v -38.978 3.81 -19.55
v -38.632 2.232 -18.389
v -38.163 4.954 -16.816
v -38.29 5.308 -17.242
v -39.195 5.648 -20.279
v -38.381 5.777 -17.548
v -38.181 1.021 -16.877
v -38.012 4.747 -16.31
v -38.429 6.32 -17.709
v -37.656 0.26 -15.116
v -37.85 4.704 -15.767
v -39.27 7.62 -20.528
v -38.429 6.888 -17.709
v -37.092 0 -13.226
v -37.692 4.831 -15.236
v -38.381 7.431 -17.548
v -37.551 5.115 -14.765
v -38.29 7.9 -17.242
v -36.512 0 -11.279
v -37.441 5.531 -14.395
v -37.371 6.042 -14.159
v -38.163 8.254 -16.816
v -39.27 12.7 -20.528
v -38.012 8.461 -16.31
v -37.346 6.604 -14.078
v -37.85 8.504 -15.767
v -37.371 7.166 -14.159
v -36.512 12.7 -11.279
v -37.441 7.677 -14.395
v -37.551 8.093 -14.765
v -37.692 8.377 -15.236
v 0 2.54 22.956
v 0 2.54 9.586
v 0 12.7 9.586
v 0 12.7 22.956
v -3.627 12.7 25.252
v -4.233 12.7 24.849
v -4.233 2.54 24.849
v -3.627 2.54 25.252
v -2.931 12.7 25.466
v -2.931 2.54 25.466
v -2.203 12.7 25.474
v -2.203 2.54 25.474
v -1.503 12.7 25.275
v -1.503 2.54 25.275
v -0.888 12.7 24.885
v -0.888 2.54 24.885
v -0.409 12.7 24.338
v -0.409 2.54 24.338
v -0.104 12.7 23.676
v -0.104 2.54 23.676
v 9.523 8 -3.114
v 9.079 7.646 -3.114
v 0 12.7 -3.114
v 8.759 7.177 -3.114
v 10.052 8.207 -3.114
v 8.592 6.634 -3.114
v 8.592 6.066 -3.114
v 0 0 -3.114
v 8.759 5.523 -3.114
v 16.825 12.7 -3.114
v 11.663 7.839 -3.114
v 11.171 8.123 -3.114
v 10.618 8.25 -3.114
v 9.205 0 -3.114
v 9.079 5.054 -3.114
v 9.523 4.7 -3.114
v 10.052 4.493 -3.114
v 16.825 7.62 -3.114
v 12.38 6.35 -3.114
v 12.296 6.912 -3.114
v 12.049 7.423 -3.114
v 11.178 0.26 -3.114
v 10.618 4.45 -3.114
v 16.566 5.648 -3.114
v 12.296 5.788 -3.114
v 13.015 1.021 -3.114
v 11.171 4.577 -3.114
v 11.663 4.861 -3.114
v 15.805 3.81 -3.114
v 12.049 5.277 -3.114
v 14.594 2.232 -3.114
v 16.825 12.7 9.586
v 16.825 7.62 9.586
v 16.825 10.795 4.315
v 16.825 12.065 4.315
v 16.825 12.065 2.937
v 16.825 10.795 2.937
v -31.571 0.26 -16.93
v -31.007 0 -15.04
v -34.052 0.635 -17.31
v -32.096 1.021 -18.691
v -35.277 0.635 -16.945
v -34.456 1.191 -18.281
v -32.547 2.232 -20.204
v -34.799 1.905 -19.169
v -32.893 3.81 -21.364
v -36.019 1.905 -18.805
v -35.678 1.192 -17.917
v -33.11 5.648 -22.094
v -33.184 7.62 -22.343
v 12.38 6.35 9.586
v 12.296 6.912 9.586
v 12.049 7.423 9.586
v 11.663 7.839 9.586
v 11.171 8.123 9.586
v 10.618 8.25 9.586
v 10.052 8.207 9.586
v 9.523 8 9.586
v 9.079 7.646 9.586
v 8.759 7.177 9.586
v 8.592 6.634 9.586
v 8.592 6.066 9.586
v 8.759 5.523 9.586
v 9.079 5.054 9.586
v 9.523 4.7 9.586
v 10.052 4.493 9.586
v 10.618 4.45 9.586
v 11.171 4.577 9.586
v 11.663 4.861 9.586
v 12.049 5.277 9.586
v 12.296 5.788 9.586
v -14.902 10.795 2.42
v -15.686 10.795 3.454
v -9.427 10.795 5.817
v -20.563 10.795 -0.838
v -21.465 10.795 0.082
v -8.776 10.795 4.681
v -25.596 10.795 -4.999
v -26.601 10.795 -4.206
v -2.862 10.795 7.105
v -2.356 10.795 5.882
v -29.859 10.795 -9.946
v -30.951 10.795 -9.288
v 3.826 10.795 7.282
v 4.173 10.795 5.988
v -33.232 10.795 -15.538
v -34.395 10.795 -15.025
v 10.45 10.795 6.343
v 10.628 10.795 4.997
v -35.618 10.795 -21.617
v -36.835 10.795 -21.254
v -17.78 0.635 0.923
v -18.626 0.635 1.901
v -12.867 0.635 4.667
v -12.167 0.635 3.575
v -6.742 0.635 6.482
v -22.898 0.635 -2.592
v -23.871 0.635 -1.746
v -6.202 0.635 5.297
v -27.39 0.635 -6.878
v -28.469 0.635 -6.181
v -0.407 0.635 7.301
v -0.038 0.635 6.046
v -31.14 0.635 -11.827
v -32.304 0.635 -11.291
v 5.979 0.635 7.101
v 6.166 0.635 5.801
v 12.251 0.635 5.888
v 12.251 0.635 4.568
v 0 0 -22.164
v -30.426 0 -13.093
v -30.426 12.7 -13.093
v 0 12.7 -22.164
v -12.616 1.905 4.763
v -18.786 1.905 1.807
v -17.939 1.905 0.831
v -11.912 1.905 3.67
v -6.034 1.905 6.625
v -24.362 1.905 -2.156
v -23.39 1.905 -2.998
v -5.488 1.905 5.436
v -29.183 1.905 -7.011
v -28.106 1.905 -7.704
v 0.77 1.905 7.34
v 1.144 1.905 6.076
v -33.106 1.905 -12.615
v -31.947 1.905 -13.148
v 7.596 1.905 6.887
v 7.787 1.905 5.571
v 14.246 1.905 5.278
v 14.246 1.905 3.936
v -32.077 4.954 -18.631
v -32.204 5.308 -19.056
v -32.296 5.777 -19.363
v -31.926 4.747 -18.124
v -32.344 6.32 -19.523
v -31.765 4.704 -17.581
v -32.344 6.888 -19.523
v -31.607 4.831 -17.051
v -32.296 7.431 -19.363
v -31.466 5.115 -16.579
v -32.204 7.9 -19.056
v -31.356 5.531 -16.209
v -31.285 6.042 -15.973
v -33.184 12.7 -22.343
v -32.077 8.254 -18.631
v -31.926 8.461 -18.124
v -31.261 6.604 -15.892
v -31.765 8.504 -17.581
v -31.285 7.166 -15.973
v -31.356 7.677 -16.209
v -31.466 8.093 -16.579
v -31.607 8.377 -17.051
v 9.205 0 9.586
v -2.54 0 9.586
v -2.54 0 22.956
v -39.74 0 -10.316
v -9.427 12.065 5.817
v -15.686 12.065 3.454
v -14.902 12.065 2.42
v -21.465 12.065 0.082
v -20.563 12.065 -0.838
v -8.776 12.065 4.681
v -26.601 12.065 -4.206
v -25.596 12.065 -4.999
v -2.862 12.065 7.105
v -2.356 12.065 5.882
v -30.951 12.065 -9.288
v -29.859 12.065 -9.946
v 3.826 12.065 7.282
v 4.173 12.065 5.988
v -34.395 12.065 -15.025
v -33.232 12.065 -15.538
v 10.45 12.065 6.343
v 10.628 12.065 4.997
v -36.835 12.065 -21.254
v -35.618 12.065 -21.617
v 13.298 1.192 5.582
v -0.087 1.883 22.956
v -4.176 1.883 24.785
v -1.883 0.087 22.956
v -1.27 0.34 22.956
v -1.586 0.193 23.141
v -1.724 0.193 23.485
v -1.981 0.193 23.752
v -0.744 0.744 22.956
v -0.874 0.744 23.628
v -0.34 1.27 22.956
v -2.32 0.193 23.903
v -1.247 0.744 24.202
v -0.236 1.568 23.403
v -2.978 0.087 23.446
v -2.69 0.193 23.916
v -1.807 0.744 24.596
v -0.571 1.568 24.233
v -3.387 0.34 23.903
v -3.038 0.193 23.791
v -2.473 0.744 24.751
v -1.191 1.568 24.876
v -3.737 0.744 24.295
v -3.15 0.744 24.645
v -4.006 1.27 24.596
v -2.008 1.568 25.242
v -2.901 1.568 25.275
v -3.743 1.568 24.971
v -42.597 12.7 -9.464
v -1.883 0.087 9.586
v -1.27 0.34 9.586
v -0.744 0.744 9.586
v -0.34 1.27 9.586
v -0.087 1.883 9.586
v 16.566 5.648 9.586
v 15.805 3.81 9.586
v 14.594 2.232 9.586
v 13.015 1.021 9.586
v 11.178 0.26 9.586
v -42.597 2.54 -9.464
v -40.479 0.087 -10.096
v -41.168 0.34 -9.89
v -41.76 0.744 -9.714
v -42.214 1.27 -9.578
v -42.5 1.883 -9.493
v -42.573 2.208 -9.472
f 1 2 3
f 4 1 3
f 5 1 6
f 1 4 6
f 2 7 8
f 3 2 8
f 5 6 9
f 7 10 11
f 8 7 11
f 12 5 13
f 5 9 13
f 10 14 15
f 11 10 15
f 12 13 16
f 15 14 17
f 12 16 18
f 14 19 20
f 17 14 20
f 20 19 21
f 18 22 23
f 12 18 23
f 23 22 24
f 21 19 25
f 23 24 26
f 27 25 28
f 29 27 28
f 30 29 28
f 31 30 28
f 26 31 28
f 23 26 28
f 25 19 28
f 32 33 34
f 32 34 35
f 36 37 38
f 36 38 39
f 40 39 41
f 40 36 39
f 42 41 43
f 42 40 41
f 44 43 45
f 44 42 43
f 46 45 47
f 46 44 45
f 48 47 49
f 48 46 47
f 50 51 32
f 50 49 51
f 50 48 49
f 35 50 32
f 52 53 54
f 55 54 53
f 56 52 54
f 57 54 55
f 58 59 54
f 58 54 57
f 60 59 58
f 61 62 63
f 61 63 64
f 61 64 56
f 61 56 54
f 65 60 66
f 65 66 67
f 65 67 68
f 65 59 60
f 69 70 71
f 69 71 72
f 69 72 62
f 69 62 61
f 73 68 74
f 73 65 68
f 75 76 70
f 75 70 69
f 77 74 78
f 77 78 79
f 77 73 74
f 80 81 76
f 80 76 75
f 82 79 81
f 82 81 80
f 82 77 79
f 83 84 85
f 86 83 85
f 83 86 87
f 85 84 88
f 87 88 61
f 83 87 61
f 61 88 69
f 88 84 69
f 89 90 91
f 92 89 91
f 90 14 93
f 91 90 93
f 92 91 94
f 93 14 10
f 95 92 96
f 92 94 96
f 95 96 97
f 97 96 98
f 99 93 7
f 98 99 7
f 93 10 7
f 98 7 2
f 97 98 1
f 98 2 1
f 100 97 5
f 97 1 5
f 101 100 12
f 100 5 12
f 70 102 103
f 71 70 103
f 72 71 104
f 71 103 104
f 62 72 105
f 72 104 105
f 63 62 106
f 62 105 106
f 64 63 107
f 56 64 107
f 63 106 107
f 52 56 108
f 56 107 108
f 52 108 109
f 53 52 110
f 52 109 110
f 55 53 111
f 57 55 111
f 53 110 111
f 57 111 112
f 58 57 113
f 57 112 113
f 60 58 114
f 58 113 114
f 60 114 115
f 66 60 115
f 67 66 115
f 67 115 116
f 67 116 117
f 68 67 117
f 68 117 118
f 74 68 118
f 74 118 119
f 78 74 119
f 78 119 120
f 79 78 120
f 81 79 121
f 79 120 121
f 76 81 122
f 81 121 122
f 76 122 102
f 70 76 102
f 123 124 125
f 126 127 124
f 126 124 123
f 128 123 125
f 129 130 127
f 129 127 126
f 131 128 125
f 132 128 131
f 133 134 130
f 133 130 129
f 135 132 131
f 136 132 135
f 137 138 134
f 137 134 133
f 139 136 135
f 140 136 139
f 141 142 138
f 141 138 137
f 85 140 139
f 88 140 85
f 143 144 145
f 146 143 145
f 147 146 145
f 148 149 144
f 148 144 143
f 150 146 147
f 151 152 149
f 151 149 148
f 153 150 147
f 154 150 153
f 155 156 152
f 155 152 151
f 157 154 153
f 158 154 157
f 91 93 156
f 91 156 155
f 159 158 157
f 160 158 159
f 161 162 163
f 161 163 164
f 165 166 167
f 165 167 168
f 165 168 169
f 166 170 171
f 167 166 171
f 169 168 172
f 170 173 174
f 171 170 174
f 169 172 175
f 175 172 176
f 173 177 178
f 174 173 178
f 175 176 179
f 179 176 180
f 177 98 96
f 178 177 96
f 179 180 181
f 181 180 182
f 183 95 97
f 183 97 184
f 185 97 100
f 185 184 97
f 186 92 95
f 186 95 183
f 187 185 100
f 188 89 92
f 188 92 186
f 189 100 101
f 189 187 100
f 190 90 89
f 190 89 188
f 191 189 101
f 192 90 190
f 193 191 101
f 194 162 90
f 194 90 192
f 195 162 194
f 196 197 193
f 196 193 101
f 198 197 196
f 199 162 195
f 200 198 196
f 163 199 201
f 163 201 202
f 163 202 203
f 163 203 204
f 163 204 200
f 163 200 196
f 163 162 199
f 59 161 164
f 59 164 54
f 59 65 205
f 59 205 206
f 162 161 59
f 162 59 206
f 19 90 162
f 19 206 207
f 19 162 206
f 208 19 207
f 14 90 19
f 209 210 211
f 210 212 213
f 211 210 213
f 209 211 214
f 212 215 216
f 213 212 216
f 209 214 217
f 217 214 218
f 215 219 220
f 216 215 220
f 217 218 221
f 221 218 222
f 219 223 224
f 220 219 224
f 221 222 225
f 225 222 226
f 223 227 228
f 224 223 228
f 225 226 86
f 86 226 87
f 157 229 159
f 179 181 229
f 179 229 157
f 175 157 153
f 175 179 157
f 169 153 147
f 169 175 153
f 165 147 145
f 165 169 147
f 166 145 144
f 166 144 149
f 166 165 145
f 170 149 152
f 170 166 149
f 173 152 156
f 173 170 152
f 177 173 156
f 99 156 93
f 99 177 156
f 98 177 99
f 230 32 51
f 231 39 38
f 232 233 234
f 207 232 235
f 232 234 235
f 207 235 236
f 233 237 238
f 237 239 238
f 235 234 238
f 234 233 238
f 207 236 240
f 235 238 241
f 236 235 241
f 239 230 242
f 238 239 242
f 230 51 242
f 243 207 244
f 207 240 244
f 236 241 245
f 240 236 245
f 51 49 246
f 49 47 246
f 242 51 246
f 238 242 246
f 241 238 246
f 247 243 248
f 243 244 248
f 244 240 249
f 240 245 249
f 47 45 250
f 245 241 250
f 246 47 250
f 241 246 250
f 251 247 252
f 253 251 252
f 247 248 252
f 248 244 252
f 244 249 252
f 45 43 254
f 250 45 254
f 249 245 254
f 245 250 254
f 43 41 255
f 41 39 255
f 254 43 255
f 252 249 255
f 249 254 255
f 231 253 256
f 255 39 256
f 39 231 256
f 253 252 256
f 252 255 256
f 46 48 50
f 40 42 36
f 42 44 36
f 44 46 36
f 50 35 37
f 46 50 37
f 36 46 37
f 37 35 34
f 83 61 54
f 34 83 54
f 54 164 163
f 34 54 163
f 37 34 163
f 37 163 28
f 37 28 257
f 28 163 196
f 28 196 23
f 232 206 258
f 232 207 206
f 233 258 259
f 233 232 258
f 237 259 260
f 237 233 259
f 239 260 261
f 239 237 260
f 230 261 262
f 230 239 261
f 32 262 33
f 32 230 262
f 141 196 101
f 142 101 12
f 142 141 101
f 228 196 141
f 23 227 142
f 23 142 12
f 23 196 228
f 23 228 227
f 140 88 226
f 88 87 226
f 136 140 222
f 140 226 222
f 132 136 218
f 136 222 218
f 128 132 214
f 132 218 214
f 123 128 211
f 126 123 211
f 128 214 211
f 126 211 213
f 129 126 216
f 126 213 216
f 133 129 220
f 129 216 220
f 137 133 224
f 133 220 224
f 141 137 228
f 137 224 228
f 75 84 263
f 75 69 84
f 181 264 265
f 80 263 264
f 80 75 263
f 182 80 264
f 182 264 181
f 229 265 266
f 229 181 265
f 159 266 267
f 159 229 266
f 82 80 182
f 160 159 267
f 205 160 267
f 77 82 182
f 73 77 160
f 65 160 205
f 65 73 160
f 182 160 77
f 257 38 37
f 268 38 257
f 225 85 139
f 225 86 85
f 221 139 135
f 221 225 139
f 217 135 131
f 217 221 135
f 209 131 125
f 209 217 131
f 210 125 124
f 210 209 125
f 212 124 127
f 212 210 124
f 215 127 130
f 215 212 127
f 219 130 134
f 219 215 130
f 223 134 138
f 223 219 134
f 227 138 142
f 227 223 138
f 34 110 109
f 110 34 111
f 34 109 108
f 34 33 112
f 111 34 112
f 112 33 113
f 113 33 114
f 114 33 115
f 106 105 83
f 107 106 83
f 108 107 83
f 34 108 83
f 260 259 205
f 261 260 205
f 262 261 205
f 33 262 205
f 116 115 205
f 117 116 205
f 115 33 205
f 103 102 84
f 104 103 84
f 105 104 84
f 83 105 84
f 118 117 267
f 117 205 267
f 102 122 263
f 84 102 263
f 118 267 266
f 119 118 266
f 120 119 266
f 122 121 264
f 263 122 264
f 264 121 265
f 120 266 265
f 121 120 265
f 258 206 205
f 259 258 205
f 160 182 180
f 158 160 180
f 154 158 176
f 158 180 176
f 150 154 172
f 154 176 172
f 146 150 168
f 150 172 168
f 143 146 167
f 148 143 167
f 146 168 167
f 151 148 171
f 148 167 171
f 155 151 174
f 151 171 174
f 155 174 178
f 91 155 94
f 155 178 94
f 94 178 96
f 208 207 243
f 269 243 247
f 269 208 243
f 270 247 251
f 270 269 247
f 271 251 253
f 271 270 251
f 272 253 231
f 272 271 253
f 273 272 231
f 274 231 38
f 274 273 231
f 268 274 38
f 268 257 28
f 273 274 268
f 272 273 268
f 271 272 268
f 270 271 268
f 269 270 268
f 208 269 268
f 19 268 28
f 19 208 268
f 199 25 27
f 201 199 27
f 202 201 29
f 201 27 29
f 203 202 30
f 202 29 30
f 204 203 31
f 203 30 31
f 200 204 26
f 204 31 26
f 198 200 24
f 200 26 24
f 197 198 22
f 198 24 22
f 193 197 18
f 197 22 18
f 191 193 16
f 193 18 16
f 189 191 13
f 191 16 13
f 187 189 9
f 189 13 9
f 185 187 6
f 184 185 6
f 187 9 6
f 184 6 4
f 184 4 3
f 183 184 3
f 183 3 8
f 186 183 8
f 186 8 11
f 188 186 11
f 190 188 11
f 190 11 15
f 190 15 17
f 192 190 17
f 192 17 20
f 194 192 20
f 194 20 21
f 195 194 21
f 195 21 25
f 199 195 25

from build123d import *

# Parameters (mm, degrees)
SKETCH1_W           = 16.825477707
SKETCH1_H           = 12.7
BOSS_EXTRUDE1_DEPTH = 12.7
FILLET1_R           = 7.62
SKETCH2_R           = 1.905
CUT_EXTRUDE1_DEPTH  = 12.7
SKETCH3_W           = 6.35
SKETCH3_H           = 12.7
BOSS_EXTRUDE2_DEPTH = 9.652
FILLET2_R           = 7.62
SKETCH4_R           = 1.905
CUT_EXTRUDE2_DEPTH  = 12.7
FILLET3_R           = 2.54
SKETCH5_W           = 1.27
SKETCH5_H           = 1.27
FILLET4_R           = 2.54


with BuildPart() as part:
    # Sketch1 → Boss-Extrude1 (new body)
    with BuildSketch(Plane(origin=(0, 0, 0), x_dir=(1, 0, 0), z_dir=(0, 1, 0))):
        Polygon((-42.597094971, 9.46433121), (0, 22.16433121), (0, -28.63566879), align=None)
        with Locations((8.412738854, -3.23566879)):
            Rectangle(SKETCH1_W, SKETCH1_H)
    extrude(amount=BOSS_EXTRUDE1_DEPTH)

    # Fillet1
    fillet1_edges = [part.edges().sort_by_distance(p)[0] for p in [
        (16.825477707, 0, 3.23566879),
    ]]
    fillet(fillet1_edges, radius=FILLET1_R)

    # Sketch2 → Cut-Extrude1 (cut)
    with BuildSketch(Plane.XY.offset(9.58566879)):
        with Locations((10.475477707, 6.35)):
            Circle(SKETCH2_R)
    extrude(amount=-CUT_EXTRUDE1_DEPTH, mode=Mode.SUBTRACT)

    # Sketch3 → Boss-Extrude2 (add)
    with BuildSketch(Plane(origin=(-6.06868791, 0, -20.35499805), x_dir=(-0.9583148474999098, 0, 0.2857142857142858), z_dir=(-0.2857142857142858, 0, -0.9583148474999098))):
        with Locations((28.59233394, 6.35)):
            Rectangle(SKETCH3_W, SKETCH3_H)
    extrude(amount=BOSS_EXTRUDE2_DEPTH)

    # Fillet2
    fillet2_edges = [part.edges().sort_by_distance(p)[0] for p in [
        (-36.226860335, 0, -21.43541469),
    ]]
    fillet(fillet2_edges, radius=FILLET2_R)

    # Sketch4 → Cut-Extrude2 (cut)
    with BuildSketch(Plane(origin=(-30.44310778, 0, 9.076381126), x_dir=(0.2857142857142858, 0, 0.9583148474999098), z_dir=(-0.9583148474999098, 0, 0.2857142857142858))):
        with Locations((-26.066407684, 6.604)):
            Circle(SKETCH4_R)
    extrude(amount=-CUT_EXTRUDE2_DEPTH, mode=Mode.SUBTRACT)

    # Fillet3
    fillet3_edges = [part.edges().sort_by_distance(p)[0] for p in [
        (0, 6.35, 28.63566879),
    ]]
    fillet(fillet3_edges, radius=FILLET3_R)

    # Sketch5 → Cut-Revolve1 (revolve, cut)
    with BuildSketch(Plane(origin=(-8.826402195, 0, -29.604652958), x_dir=(-0.9583148474999099, 0, 0.28571428571428553), z_dir=(-0.28571428571428553, 0, -0.9583148474999099))):
        with Locations((28.59233394, 11.43)):
            Rectangle(SKETCH5_W, SKETCH5_H)
        with Locations((28.59233394, 1.27)):
            Rectangle(SKETCH5_W, SKETCH5_H)
    revolve(axis=Axis((1.537963556, 18.050379457, -32.694709807), (0, -1, 0)), mode=Mode.SUBTRACT)

    # Fillet4
    fillet4_edges = [part.edges().sort_by_distance(p)[0] for p in [
        (0, 0, 16.270862458),
        (-23.415214152, 0, 7.692464569),
        (-1.503049342, 0, 25.274748287),
    ]]
    fillet(fillet4_edges, radius=FILLET4_R)


solid = part.part
